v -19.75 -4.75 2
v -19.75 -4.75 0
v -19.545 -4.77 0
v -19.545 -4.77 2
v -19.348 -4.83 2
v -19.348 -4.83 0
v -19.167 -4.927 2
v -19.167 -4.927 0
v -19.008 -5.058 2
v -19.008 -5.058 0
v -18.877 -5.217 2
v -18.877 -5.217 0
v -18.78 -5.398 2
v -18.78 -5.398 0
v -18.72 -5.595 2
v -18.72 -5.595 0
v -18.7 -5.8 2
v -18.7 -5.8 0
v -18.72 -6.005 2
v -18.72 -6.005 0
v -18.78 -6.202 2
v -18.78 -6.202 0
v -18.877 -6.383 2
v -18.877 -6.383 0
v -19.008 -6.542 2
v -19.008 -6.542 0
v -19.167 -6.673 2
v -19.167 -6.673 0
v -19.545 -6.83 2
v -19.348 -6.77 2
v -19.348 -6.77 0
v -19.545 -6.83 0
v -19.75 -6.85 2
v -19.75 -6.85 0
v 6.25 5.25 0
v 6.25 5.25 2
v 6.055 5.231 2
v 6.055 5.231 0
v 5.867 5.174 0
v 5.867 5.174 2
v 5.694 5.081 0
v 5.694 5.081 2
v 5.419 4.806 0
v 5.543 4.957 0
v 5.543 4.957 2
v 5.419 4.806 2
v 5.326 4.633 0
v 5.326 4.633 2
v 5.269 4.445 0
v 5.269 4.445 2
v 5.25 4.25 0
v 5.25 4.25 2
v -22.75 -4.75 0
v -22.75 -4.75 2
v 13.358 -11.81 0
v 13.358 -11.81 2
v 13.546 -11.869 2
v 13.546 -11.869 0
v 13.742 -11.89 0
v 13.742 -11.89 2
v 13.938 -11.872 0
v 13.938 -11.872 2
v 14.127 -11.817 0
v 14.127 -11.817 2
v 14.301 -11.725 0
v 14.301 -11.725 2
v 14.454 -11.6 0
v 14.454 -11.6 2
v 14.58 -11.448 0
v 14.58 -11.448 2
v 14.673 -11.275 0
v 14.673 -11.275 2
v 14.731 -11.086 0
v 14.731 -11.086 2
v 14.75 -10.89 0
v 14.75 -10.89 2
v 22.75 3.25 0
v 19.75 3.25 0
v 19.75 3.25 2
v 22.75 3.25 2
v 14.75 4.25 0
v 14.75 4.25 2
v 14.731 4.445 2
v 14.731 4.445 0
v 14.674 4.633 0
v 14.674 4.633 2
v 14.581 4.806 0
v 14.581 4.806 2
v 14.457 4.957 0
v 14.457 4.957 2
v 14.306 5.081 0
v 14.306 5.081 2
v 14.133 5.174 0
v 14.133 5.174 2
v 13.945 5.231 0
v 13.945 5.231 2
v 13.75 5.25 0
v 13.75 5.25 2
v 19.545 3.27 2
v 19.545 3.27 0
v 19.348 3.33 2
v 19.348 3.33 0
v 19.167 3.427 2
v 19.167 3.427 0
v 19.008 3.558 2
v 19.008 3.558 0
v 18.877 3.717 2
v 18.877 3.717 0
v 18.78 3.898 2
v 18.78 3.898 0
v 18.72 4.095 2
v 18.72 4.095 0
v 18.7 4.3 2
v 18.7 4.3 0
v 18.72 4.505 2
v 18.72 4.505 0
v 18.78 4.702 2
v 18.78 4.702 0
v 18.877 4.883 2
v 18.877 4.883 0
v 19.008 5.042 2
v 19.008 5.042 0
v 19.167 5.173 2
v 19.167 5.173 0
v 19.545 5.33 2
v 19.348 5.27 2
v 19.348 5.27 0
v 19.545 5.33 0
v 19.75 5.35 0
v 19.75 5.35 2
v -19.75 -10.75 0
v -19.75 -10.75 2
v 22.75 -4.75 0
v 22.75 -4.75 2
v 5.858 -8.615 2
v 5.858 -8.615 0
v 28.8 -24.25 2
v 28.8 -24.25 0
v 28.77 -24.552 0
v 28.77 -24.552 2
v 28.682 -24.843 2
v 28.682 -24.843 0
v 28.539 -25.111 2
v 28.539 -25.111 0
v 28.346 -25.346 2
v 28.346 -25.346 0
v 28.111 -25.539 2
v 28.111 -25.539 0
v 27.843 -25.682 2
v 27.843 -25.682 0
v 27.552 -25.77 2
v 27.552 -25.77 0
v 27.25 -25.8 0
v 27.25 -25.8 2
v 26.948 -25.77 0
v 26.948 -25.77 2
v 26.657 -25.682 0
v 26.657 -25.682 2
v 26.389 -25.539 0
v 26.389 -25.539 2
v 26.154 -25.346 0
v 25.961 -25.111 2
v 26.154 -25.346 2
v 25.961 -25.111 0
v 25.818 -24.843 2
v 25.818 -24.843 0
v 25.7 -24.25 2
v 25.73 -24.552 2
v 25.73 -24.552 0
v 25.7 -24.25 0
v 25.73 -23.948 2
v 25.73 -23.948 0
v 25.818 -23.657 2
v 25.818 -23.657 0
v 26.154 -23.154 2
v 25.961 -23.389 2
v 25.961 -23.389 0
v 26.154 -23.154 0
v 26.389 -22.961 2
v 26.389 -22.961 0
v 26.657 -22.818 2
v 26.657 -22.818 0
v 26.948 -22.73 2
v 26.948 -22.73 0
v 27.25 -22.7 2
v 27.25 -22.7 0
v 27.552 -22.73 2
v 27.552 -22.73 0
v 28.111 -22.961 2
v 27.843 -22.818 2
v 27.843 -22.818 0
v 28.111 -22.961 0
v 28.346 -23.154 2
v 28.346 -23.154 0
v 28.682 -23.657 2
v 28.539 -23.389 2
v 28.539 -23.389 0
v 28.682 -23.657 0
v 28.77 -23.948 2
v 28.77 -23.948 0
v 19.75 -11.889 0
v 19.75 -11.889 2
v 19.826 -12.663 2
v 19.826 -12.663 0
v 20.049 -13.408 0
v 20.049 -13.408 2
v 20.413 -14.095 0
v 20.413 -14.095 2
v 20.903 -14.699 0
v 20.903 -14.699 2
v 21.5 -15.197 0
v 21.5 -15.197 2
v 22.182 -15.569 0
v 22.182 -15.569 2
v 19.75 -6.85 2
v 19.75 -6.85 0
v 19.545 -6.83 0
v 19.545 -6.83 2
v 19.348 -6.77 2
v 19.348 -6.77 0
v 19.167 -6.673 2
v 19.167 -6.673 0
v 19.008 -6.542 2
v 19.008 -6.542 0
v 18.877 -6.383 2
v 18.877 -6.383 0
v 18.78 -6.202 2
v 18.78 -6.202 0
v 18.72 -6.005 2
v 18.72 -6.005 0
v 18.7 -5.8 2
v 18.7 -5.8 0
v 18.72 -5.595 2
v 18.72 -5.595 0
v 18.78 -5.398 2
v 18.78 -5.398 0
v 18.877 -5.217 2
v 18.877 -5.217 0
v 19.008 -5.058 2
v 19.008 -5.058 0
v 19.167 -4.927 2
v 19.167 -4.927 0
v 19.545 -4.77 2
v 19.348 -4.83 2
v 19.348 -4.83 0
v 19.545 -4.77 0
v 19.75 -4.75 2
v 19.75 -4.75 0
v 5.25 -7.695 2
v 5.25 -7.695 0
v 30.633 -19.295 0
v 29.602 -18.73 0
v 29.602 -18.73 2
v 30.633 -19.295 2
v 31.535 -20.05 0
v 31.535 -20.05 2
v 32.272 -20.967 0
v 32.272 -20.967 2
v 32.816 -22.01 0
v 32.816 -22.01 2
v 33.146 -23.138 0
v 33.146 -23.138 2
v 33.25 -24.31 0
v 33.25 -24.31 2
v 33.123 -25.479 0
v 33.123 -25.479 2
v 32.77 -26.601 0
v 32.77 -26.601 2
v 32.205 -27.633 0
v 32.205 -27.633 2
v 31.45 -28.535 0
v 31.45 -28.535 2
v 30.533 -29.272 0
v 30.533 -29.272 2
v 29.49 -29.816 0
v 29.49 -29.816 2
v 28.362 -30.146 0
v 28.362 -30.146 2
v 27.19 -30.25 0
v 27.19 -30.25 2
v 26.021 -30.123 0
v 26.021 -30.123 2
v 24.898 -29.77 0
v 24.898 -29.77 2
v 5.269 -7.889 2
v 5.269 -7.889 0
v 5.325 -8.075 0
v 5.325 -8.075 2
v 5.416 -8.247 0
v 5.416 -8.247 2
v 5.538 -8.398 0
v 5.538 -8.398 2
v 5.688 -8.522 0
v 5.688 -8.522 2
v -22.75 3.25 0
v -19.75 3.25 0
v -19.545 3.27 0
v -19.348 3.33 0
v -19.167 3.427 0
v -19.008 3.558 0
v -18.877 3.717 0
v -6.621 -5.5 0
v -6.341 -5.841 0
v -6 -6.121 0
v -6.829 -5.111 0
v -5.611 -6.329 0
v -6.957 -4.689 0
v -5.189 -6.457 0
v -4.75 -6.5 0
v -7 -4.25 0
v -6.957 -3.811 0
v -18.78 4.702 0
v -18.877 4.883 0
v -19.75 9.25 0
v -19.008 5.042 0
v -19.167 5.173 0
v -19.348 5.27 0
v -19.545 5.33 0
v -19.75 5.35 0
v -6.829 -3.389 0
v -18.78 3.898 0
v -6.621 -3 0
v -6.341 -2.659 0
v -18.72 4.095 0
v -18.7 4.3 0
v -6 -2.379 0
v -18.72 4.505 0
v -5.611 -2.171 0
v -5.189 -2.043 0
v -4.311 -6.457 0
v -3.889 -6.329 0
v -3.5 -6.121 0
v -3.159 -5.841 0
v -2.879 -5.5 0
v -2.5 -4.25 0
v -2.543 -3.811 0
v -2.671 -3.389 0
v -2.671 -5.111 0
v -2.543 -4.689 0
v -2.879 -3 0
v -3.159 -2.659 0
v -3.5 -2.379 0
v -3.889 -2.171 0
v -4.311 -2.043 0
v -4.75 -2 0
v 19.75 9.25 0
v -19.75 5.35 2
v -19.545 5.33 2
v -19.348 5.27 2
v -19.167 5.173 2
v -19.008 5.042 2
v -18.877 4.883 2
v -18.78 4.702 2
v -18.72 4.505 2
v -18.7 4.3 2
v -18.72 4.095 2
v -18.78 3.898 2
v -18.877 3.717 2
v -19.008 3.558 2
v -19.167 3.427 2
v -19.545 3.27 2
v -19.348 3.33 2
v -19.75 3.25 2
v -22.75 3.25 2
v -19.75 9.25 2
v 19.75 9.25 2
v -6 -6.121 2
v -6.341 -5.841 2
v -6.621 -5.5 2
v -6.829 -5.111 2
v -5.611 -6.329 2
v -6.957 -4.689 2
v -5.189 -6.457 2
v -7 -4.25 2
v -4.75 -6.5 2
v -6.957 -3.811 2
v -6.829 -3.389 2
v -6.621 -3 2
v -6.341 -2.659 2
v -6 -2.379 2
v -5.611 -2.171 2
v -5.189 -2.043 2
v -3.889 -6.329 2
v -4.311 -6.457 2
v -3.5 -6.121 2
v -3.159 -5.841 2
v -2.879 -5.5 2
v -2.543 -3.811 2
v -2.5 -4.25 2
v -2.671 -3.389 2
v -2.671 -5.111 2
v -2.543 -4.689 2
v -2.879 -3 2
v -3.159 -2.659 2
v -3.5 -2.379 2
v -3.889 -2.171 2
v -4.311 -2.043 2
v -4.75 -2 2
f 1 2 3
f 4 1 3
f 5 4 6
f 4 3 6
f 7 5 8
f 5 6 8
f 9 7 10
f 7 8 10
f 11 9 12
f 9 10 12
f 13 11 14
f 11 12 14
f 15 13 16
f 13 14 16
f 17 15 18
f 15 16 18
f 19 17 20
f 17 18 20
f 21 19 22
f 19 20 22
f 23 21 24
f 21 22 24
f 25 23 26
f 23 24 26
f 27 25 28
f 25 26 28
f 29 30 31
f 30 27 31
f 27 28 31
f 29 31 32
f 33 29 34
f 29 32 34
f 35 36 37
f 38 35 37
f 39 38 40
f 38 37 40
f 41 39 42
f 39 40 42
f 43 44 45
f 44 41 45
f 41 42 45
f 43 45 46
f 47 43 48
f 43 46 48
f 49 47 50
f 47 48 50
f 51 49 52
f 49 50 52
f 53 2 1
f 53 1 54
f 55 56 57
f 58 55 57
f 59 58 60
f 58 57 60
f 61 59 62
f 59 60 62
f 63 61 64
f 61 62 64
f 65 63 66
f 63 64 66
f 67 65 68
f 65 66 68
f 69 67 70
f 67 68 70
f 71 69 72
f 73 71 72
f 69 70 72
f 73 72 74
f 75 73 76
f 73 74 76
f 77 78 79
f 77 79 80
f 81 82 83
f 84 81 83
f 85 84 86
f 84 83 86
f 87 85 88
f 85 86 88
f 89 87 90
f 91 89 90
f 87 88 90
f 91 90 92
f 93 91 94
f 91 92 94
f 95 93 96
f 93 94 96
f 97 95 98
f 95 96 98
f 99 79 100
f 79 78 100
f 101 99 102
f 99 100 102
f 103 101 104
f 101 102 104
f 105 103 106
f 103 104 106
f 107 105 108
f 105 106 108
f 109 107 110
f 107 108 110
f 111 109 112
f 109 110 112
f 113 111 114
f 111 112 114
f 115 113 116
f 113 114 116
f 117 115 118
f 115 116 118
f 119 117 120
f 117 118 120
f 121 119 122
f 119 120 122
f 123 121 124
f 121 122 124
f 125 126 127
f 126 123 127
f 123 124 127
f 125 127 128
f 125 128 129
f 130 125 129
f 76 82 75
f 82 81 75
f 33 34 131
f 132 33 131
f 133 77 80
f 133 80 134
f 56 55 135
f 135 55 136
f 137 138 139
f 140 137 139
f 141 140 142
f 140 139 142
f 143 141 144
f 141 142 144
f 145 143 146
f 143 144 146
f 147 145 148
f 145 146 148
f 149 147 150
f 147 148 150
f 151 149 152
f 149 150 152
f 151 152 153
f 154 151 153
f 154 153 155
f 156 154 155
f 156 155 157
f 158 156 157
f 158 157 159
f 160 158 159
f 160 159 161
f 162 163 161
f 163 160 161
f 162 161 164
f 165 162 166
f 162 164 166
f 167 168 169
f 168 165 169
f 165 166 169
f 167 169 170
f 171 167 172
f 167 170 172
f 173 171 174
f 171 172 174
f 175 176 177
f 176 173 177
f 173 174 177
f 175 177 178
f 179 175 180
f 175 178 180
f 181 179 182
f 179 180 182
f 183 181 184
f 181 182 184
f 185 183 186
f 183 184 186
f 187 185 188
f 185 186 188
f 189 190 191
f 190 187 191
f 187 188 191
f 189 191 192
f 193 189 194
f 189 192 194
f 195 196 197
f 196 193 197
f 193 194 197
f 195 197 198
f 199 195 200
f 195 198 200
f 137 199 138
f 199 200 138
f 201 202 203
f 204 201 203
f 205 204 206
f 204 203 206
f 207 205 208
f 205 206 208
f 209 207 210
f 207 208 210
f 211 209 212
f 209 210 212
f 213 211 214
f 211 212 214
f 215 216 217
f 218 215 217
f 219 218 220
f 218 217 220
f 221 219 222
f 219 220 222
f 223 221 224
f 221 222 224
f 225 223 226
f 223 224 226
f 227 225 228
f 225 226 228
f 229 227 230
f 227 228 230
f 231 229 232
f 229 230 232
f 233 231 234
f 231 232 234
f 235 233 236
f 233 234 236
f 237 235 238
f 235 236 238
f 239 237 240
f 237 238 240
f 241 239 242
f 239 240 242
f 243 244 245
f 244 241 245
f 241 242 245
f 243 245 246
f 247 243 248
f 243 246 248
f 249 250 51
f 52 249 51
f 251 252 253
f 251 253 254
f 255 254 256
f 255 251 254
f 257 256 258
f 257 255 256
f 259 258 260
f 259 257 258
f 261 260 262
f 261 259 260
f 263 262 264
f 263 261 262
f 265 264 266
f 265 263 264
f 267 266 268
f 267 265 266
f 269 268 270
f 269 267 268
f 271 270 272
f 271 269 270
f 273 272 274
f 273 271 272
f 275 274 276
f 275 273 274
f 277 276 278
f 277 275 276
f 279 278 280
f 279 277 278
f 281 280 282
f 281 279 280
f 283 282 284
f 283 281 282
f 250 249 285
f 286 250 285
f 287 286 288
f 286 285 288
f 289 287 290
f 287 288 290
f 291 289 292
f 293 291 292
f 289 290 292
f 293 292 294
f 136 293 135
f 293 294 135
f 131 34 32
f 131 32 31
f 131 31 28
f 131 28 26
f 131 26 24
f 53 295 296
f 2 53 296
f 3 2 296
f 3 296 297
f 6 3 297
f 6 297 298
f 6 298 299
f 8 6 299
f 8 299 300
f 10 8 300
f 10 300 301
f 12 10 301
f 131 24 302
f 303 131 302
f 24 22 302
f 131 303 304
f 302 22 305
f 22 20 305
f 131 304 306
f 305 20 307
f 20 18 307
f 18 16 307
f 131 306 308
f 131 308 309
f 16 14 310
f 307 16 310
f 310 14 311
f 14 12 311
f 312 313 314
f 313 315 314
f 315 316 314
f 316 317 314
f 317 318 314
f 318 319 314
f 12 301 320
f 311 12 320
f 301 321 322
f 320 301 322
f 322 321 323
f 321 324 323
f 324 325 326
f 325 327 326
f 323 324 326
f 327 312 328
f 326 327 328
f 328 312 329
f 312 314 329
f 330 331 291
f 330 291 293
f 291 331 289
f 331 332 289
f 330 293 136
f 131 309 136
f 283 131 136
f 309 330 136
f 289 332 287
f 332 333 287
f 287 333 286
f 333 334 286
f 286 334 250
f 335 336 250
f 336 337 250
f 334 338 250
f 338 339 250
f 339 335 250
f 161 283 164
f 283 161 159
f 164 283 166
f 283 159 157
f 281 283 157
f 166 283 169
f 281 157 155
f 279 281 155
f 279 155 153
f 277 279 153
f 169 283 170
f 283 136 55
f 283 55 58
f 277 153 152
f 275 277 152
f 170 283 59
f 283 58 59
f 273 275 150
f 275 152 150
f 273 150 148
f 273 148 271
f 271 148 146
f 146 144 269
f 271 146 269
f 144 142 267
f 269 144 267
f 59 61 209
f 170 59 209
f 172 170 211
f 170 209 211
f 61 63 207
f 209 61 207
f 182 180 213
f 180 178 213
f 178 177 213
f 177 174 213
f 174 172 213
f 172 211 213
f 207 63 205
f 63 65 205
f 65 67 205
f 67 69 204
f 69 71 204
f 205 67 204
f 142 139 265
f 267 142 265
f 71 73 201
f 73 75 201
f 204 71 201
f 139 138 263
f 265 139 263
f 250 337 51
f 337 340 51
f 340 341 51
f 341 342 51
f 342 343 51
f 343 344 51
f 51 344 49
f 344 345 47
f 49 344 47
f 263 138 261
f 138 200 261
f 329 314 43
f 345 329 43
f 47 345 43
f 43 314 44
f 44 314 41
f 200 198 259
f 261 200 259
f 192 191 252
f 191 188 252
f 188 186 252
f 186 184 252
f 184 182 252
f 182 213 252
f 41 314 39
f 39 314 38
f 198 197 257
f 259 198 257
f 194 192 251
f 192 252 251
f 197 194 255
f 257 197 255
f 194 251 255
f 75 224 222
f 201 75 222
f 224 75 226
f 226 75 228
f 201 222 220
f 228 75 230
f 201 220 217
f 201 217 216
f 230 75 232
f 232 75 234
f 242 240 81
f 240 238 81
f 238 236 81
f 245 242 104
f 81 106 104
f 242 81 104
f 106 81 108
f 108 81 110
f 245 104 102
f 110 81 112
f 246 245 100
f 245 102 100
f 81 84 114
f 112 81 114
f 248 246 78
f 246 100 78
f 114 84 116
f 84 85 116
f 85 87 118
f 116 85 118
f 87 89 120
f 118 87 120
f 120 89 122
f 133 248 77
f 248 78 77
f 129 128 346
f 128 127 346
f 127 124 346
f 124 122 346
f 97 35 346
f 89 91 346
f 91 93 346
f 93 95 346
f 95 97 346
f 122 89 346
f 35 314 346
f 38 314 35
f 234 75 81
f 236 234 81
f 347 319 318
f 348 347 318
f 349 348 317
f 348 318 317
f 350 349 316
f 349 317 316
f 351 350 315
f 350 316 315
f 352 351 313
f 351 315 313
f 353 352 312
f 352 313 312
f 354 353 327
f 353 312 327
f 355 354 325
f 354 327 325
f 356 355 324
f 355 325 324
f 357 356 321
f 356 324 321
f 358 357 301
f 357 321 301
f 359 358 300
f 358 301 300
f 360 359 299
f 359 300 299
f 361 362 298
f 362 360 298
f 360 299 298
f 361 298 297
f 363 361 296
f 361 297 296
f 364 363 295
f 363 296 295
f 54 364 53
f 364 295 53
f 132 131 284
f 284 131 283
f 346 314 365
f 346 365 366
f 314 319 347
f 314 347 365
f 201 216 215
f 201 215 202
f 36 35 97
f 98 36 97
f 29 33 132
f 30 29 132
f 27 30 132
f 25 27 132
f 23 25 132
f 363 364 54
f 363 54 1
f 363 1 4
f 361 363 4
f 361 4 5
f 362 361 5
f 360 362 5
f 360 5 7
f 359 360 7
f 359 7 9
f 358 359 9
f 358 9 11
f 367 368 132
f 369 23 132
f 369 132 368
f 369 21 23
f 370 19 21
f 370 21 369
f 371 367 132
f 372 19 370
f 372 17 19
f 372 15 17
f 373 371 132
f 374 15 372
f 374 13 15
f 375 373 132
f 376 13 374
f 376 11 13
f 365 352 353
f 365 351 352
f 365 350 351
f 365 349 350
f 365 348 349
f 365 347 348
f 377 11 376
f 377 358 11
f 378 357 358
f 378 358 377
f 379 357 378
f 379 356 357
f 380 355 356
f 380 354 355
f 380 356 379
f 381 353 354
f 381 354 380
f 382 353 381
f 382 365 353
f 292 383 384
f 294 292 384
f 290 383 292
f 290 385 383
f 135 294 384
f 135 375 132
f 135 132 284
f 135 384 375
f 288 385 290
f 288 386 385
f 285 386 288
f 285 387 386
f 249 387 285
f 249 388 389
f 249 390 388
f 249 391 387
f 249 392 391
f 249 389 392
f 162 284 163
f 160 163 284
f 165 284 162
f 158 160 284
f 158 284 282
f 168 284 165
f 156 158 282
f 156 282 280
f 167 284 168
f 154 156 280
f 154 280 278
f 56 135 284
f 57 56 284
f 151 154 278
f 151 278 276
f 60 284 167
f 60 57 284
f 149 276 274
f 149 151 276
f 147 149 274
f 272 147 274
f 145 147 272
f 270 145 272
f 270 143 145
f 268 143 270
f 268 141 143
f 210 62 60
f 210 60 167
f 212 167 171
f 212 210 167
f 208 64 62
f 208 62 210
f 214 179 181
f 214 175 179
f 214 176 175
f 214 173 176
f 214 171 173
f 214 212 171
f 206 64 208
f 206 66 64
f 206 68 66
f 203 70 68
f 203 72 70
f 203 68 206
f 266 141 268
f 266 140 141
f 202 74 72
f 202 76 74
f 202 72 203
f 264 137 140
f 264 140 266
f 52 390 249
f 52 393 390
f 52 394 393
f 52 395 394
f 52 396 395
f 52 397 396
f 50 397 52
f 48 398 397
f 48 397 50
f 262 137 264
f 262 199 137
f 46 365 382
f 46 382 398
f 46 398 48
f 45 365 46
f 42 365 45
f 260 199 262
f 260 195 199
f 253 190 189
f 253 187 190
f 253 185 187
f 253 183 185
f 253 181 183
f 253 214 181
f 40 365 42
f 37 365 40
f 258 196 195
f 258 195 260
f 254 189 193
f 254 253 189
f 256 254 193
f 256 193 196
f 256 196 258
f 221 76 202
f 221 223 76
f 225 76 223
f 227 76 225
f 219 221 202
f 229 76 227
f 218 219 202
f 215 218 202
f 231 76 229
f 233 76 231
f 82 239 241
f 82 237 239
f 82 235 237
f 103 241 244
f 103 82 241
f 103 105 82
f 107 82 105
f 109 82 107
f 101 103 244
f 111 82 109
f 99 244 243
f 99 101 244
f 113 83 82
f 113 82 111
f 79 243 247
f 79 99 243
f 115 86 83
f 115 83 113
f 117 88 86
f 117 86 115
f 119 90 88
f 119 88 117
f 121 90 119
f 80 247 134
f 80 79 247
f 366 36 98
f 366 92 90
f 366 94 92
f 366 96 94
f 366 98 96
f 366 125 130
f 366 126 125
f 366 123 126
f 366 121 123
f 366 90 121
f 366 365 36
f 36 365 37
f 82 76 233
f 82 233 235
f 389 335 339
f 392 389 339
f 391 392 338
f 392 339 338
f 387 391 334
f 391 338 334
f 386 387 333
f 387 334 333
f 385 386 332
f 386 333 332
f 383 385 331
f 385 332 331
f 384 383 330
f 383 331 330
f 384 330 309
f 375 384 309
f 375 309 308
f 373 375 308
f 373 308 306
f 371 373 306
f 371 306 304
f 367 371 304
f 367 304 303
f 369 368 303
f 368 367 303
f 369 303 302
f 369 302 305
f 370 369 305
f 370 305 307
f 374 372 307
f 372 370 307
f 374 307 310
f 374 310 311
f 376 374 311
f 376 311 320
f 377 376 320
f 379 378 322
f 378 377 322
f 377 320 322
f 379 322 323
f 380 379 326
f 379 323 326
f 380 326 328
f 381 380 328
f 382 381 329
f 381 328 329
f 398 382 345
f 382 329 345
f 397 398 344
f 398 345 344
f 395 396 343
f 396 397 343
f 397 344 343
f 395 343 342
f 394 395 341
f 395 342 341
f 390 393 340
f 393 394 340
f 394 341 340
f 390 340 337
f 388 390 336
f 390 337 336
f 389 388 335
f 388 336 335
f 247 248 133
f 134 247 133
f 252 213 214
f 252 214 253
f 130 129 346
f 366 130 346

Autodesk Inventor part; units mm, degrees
ref_plane "YZ Plane" through (0, 0, 0) normal (1, 0, 0) x (0, 1, 0)
ref_plane "XZ Plane" through (0, 0, 0) normal (0, 1, 0) x (-1, 0, 0)
ref_plane "XY Plane" through (0, 0, 0) normal (0, 0, 1) x (1, 0, 0)
sketch "スケッチ1" plane through (0, 0, 0) normal (0, 0, 1) x (1, 0, 0)
  line L0 (-19.75, 25.75) -> (19.75, 25.75) construction
  line L1 (19.75, 25.75) -> (19.75, -25.75) construction
  line L2 (19.75, -25.75) -> (-19.75, -25.75) construction
  line L3 (-19.75, -25.75) -> (-19.75, 25.75) construction
  line L4 (-19.75, 25.75) -> (19.75, -25.75) construction
  line L5 (19.75, 25.75) -> (-19.75, -25.75) construction
  circle A0 centre (27.25, -24.25) radius 1.55
  circle A1 centre (-4.75, -4.25) radius 2.25
  line L6 (0, 25.75) -> (0, -25.75) construction
  line L7 (-19.75, 3.25) -> (-22.75, 3.25)
  line L8 (-22.75, 3.25) -> (-22.75, -4.75)
  arc A2 (-19.75, 3.25) -> (-19.75, 5.35) centre (-19.75, 4.3) ccw
  line L9 (-22.75, -0.75) -> (-19.75, -0.75) construction
  line L10 (-19.75, -4.75) -> (-22.75, -4.75)
  arc A3 (-19.75, -6.85) -> (-19.75, -4.75) centre (-19.75, -5.8) ccw
  line L11 (-19.75, 5.35) -> (-19.75, 9.25)
  line L12 (-19.75, 9.25) -> (19.75, 9.25)
  line L13 (22.75, 3.25) -> (22.75, -4.75)
  arc A4 (19.75, 5.35) -> (19.75, 3.25) centre (19.75, 4.3) ccw
  line L14 (19.75, -4.75) -> (22.75, -4.75)
  arc A5 (19.75, -4.75) -> (19.75, -6.85) centre (19.75, -5.8) ccw
  line L15 (19.75, 5.35) -> (19.75, 9.25)
  line L16 (19.75, 3.25) -> (22.75, 3.25)
  arc A6 (24.8985, -29.77) -> (29.6015, -18.73) centre (27.25, -24.25) ccw
  line L17 (-19.75, -6.85) -> (-19.75, -10.75)
  line L18 (-19.75, -10.75) -> (24.8985, -29.77)
  line L19 (19.75, -6.85) -> (19.75, -14.5333)
  line L20 (19.75, -14.5333) -> (29.6015, -18.73)
  circle A7 centre (-4.75, -4.25) radius 6 construction
  circle A8 centre (27.25, -24.25) radius 6 construction
  line L21 (5.25, 5.25) -> (14.75, 5.25)
  line L22 (14.75, 5.25) -> (14.75, -12.4033)
  line L23 (14.75, -12.4033) -> (5.25, -8.3564)
  line L24 (5.25, -8.3564) -> (5.25, 5.25)
  point P0 (0, 0)
  dimension "d0" = 39.5
  dimension "d1" = 51.5
  dimension "d2" = 3.1
  dimension "d3" = 4.5
  dimension "d4" = 32
  dimension "d5" = 20
  dimension "d6" = 3
  dimension "d7" = 1.05
  dimension "d8" = 8
  dimension "d9" = 26.5
  dimension "d11" = 30
  dimension "d12" = 15
  dimension "d13" = 6
  dimension "d14" = 12
  dimension "d19" = 12
  dimension "d20" = 12
  dimension "d21" = 4
  dimension "d22" = 5
  dimension "d24" = 4
extrude "押し出し1" add sketch "スケッチ1" along normal blind 2
fillet "フィレット1" radius 4 1 edges at (19.75, -14.5333, 1)
fillet "フィレット2" radius 1 4 edges at (5.25, 5.25, 1) (14.75, 5.25, 1) (5.25, -8.3564, 1) (14.75, -12.4033, 1)
equation "\"d24\" = d21"
properties part number "Leg_Joint_side_frame" material "アルミニウム 2014-T4"
